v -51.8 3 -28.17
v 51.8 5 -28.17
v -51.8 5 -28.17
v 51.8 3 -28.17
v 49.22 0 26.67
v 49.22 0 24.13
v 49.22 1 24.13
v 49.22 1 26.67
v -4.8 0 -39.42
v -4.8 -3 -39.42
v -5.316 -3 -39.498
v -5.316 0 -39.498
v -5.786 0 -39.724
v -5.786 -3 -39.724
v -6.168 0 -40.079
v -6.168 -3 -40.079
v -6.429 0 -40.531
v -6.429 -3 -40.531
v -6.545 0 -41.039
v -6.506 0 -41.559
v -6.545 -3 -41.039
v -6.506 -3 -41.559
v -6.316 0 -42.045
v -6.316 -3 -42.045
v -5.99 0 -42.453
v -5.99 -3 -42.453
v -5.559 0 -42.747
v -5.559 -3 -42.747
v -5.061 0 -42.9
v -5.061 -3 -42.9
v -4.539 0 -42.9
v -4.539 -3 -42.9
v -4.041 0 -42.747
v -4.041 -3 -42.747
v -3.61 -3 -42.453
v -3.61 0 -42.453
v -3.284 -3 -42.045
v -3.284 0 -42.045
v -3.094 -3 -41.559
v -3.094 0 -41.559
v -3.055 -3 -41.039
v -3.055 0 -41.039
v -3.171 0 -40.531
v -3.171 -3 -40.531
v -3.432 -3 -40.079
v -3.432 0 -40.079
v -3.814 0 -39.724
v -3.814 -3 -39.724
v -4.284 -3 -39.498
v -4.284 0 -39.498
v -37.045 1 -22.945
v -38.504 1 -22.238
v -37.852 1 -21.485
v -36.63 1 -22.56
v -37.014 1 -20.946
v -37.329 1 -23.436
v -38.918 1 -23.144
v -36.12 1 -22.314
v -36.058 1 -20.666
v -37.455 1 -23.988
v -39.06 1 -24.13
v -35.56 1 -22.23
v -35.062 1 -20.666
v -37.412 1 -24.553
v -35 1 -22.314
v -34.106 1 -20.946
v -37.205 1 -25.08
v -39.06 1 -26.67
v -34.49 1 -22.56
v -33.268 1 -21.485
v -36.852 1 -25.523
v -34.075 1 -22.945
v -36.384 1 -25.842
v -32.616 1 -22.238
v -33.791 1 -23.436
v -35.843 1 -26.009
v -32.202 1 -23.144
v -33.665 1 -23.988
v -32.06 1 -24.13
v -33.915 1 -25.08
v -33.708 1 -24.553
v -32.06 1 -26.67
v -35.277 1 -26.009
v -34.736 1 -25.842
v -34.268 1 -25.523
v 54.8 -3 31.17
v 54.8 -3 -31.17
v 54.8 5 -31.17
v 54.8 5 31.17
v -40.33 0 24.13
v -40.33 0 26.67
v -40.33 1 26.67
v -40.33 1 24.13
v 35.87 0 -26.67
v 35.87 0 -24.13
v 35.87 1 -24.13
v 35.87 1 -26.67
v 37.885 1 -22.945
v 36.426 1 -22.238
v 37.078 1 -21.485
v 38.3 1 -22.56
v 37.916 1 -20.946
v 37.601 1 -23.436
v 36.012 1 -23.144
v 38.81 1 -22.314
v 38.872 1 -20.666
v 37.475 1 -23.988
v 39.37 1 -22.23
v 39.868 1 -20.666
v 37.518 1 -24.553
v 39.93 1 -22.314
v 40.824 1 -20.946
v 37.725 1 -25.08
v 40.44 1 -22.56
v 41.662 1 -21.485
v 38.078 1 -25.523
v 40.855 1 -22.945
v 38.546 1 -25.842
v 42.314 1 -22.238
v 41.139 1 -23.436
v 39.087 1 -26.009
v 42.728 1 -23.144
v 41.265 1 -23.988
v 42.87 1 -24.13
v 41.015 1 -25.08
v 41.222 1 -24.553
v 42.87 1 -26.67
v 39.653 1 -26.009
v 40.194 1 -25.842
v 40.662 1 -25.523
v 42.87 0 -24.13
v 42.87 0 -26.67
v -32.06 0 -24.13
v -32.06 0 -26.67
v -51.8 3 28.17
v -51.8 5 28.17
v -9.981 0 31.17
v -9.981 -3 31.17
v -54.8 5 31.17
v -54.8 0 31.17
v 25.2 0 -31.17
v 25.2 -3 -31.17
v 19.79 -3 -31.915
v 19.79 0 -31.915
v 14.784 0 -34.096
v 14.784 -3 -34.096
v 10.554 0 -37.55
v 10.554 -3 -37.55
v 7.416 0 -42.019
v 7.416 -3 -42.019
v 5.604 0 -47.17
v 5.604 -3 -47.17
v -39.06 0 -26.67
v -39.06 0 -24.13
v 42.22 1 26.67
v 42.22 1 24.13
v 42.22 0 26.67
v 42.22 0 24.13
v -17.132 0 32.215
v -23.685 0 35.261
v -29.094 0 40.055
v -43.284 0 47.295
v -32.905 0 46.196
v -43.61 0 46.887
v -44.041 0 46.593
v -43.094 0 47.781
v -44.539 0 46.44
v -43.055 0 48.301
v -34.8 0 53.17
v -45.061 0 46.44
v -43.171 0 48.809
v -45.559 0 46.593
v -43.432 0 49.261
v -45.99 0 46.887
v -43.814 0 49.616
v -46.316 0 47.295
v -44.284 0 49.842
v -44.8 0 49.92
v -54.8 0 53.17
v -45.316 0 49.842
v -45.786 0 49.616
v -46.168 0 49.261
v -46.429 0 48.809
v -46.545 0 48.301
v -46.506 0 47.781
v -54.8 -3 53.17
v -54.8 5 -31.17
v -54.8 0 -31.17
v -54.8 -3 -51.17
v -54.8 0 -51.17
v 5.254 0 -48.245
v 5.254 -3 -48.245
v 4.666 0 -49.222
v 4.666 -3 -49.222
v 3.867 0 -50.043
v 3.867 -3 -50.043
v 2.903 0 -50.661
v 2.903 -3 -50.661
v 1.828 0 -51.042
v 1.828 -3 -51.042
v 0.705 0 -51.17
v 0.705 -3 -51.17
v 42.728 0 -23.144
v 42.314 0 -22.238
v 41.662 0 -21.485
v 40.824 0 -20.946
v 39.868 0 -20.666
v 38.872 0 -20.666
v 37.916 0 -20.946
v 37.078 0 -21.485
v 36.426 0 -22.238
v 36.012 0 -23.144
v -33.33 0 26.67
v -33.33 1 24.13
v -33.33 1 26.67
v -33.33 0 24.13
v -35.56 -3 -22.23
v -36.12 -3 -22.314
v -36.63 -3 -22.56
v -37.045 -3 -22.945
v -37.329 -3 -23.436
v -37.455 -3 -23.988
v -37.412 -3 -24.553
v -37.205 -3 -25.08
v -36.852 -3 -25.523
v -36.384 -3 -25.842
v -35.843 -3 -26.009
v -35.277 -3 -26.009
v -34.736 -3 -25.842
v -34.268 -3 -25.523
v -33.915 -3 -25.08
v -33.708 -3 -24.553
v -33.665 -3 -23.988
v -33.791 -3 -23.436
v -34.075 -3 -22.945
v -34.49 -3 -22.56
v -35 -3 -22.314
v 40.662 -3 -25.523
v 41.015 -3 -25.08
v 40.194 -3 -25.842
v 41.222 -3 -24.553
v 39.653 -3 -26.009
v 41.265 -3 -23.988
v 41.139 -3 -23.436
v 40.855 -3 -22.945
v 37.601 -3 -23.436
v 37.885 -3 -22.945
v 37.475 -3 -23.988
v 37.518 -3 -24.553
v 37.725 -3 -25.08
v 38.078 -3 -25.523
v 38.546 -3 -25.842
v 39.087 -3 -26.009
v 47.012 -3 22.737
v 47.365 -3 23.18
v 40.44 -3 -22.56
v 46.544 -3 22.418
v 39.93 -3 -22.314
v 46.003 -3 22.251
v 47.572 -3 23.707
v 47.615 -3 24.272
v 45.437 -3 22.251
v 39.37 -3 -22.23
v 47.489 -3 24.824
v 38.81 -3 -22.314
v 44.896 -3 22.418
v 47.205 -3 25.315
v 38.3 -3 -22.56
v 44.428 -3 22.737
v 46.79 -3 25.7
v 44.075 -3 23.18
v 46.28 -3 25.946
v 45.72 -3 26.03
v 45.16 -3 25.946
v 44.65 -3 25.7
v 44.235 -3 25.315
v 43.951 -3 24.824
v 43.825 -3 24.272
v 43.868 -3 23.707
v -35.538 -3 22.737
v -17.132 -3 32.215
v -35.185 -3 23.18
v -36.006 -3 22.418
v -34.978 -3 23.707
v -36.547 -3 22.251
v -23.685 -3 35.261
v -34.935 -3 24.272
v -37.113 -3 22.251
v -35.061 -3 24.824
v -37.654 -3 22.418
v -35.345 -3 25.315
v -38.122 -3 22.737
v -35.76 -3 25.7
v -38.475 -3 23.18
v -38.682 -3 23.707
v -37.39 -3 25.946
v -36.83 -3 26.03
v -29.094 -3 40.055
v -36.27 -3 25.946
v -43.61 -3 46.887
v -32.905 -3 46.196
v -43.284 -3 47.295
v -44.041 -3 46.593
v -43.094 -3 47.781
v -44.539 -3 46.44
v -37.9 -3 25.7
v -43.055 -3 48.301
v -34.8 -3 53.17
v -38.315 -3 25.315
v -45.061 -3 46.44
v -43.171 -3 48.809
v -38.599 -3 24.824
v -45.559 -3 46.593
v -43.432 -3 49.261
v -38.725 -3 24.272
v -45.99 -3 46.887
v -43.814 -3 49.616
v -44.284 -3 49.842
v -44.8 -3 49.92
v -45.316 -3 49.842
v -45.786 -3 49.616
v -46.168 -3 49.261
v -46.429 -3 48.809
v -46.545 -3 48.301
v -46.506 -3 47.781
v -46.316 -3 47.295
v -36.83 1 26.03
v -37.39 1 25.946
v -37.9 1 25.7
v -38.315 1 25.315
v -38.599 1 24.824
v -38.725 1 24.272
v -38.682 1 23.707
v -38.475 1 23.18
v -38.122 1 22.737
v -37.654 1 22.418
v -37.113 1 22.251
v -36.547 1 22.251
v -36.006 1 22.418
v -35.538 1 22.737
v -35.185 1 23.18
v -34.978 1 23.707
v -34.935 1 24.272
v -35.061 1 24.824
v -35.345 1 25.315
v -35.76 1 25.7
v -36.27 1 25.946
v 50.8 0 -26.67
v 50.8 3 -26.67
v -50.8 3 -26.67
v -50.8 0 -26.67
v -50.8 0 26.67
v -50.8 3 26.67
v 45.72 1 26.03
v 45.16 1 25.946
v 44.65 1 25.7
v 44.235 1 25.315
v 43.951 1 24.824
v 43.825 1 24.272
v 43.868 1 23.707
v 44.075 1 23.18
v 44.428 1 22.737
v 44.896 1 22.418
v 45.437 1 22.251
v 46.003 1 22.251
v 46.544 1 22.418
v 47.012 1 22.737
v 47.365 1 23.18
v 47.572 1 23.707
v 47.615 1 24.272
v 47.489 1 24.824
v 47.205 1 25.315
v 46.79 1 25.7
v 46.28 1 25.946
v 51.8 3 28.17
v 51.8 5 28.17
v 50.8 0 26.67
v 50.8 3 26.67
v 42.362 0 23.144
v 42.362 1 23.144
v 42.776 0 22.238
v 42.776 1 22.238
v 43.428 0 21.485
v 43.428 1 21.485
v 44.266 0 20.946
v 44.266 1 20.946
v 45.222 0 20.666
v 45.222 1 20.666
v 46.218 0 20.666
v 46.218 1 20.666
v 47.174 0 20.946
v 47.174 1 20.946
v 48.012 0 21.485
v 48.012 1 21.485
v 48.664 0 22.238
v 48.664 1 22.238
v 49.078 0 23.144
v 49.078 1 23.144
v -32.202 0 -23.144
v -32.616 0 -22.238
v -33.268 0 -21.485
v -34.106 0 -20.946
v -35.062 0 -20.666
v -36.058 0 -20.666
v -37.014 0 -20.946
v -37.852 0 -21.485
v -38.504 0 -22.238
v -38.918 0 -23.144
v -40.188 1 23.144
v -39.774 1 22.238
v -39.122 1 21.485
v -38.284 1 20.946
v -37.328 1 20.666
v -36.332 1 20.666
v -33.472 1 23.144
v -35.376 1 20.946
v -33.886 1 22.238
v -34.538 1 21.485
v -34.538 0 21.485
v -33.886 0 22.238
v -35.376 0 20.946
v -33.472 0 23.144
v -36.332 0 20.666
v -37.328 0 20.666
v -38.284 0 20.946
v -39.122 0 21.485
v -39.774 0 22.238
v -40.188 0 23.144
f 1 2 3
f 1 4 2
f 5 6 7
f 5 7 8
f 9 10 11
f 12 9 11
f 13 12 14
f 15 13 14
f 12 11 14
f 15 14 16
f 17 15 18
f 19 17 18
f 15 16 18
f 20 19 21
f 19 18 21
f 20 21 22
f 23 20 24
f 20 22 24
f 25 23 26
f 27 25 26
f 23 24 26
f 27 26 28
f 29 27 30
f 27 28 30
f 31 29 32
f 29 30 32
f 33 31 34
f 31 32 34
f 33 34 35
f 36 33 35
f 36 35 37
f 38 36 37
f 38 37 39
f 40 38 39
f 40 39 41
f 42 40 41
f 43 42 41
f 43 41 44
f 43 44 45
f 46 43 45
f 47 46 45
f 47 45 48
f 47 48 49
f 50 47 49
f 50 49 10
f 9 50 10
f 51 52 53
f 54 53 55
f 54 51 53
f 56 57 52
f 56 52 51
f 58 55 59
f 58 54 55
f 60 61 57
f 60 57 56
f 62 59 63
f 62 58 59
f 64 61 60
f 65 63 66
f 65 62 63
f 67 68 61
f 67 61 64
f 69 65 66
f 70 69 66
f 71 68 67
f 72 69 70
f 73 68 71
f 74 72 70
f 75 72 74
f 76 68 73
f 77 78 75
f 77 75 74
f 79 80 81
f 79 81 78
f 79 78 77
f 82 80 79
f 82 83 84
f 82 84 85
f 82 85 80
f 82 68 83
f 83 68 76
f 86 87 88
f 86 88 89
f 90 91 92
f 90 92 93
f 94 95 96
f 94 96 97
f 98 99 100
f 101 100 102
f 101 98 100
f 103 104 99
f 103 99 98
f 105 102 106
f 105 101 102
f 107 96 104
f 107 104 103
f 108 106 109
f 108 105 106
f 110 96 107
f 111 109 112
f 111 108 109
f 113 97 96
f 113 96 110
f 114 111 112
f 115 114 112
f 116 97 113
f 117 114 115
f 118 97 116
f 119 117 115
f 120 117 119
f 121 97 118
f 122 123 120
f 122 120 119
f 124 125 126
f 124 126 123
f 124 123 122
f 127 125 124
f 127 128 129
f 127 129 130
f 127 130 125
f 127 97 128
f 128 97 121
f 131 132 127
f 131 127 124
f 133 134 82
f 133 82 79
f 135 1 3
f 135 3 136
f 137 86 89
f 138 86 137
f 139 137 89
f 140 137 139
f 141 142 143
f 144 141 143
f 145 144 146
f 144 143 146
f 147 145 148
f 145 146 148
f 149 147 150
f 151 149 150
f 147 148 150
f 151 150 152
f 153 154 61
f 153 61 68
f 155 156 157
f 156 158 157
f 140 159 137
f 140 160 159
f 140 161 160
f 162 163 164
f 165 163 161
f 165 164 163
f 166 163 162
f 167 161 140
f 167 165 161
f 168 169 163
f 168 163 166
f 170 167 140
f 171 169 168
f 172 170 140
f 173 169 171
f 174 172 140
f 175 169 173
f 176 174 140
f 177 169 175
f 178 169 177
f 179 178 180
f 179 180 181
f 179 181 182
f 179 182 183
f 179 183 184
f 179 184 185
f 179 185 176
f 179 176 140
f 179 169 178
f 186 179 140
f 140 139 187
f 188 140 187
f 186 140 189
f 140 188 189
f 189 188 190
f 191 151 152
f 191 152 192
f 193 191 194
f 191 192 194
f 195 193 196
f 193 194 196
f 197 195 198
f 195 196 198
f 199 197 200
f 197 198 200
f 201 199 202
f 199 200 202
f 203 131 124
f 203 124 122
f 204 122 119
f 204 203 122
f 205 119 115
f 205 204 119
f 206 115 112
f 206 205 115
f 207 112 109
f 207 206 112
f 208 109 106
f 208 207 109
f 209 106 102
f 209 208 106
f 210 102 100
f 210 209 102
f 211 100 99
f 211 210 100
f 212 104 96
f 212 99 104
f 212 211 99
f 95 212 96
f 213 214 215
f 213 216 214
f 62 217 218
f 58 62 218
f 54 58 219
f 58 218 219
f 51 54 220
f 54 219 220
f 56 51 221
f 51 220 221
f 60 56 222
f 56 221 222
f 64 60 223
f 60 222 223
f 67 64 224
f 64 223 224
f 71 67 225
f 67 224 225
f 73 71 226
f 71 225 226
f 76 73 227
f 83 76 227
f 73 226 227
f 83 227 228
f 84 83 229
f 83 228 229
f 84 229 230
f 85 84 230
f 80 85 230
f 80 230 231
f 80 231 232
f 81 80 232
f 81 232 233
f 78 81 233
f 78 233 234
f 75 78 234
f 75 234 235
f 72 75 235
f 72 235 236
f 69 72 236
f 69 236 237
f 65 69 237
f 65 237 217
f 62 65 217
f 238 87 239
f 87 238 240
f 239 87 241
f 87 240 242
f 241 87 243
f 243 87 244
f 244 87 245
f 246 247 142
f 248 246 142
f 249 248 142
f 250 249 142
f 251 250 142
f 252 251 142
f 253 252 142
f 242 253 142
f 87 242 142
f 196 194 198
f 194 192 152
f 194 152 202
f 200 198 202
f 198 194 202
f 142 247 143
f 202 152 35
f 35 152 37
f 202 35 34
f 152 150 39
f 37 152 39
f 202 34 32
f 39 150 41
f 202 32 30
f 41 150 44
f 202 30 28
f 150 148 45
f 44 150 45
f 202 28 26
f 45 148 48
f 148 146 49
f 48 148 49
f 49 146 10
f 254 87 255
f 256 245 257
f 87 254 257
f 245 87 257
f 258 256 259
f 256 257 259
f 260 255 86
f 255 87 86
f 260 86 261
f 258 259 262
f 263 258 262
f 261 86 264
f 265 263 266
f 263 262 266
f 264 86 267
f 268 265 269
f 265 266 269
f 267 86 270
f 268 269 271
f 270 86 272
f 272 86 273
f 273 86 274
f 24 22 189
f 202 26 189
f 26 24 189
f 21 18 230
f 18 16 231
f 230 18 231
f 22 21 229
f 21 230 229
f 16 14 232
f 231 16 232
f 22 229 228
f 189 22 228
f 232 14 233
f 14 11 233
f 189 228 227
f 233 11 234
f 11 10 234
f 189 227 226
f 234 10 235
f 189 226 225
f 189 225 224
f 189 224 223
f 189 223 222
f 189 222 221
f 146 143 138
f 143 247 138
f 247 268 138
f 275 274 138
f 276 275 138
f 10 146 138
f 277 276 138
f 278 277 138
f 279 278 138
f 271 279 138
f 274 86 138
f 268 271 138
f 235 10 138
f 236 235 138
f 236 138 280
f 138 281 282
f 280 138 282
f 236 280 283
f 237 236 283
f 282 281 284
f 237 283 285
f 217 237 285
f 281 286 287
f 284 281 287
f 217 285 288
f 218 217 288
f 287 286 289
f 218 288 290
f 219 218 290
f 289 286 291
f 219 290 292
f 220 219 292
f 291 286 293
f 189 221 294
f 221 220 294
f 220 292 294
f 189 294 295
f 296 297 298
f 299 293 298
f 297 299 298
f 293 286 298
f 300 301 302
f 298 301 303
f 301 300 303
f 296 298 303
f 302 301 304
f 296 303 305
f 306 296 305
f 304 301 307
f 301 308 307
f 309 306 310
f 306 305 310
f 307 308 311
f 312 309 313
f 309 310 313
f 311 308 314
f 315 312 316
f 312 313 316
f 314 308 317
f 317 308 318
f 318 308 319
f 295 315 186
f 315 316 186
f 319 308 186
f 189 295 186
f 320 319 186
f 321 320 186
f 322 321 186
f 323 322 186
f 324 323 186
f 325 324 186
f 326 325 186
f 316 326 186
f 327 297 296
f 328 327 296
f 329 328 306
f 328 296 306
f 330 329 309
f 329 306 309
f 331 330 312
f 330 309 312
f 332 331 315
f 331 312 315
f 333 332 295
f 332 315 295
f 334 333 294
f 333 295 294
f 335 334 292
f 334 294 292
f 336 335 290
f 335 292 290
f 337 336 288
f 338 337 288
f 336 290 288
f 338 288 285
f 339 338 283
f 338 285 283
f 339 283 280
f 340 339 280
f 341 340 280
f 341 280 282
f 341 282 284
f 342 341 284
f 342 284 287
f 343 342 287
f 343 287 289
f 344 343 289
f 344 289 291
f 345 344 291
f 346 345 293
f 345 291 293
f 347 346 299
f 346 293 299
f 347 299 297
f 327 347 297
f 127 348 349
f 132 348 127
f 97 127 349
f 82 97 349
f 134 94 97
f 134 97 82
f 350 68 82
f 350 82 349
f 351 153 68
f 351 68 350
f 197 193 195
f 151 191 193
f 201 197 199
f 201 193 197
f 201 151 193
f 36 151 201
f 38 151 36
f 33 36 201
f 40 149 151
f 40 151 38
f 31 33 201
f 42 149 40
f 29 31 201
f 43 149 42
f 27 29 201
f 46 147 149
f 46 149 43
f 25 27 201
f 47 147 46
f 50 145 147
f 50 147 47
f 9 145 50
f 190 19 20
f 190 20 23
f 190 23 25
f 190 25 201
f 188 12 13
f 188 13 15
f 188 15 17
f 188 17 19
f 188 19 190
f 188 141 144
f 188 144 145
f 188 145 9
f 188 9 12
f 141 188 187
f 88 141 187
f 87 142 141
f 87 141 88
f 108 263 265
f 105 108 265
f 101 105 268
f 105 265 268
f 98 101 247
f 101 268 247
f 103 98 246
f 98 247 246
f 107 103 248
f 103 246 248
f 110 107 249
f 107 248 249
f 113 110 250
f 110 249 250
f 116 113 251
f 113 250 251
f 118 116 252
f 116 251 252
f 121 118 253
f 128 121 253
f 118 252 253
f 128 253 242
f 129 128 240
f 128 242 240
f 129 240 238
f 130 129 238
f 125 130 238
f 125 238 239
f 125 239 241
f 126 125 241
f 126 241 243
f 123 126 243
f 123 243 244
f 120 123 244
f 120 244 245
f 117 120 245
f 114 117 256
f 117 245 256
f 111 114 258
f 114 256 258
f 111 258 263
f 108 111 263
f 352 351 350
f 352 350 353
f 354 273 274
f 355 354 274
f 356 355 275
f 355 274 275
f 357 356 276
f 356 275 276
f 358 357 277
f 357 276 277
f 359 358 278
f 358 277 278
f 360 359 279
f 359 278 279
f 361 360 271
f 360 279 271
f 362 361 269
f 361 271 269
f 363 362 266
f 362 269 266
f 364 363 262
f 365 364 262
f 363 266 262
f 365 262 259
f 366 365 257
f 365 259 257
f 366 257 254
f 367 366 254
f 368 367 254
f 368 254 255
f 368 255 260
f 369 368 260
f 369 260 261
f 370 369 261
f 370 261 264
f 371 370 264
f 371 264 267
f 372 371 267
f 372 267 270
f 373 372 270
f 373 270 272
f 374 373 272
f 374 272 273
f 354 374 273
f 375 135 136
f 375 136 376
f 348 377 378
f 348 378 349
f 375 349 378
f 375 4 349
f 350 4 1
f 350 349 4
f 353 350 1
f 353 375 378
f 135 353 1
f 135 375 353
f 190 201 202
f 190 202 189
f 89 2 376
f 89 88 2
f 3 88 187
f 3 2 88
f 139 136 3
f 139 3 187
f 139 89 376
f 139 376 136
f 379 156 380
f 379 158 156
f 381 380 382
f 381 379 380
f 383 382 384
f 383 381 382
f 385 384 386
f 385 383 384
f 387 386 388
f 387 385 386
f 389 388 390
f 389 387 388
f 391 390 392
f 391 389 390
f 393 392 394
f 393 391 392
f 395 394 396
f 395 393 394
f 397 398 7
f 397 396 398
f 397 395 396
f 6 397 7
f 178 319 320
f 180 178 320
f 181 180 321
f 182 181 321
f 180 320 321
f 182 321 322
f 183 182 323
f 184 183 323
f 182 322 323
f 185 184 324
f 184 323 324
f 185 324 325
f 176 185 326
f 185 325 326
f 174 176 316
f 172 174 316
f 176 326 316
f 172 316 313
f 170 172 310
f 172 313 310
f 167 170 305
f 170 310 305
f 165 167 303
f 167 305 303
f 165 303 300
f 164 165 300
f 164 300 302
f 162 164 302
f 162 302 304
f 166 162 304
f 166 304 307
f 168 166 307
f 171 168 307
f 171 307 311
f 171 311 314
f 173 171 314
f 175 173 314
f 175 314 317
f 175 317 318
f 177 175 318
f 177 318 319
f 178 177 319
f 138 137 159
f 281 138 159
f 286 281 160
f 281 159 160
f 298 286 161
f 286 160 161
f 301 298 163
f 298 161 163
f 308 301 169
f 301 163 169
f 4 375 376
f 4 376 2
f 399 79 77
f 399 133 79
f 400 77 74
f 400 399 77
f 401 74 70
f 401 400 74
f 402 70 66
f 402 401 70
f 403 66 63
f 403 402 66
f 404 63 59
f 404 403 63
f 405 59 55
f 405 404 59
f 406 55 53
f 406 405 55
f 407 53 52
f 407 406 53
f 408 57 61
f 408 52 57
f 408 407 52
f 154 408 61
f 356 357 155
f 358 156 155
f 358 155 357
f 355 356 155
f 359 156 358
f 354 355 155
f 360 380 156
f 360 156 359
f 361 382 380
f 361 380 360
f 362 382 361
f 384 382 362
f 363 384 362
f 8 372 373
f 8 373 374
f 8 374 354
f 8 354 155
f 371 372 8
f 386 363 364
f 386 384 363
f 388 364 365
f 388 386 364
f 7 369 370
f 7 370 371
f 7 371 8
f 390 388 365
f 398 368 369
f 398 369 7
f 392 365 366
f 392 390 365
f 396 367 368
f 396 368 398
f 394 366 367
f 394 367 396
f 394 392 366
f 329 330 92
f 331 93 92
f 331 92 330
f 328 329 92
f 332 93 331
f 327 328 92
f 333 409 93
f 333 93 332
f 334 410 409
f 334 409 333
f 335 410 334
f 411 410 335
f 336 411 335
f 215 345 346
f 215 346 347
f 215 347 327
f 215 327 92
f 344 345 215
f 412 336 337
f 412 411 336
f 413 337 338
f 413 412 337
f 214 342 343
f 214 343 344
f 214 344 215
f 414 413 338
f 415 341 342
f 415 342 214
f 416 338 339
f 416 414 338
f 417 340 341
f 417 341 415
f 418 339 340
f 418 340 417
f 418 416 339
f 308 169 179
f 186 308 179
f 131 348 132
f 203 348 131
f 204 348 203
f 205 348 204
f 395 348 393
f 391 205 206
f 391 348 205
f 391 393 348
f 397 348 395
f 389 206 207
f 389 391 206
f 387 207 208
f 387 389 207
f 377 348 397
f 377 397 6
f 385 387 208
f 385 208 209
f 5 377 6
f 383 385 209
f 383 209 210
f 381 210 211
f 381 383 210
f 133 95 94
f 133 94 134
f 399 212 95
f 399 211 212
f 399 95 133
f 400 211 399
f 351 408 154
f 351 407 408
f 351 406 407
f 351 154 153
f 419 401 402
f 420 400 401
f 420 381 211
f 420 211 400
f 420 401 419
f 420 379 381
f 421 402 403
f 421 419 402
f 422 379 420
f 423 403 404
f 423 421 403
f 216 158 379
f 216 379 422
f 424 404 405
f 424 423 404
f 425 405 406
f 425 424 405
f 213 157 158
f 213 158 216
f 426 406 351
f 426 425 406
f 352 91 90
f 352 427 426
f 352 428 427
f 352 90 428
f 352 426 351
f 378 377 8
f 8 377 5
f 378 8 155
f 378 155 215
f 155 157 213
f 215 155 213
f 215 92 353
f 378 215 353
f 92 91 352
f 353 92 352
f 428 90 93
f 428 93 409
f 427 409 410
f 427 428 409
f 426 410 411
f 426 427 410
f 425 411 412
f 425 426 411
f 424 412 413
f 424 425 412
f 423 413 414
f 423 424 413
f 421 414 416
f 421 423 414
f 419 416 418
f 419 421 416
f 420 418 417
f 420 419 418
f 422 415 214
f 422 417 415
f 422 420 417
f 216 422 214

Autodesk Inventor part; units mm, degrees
ref_plane "YZ Plane" through (0, 0, 0) normal (1, 0, 0) x (0, 1, 0)
ref_plane "XZ Plane" through (0, 0, 0) normal (0, 1, 0) x (-1, 0, 0)
ref_plane "XY Plane" through (0, 0, 0) normal (0, 0, 1) x (1, 0, 0)
sketch "Sketch1" plane through (0, 0, 0) normal (0, 1, 0) x (-1, 0, 0)
  line L0 (-50.8, 26.67) -> (-50.8, -26.67)
  line L1 (-50.8, -26.67) -> (50.8, -26.67)
  line L2 (50.8, -26.67) -> (50.8, 26.67)
  line L3 (50.8, 26.67) -> (-50.8, -26.67) construction
  line L4 (50.8, -26.67) -> (-50.8, 26.67) construction
  line L5 (51.8, 28.17) -> (-51.8, 28.17)
  line L6 (-51.8, 28.17) -> (-51.8, -28.17)
  line L7 (-51.8, -28.17) -> (51.8, -28.17)
  line L8 (51.8, -28.17) -> (51.8, 28.17)
  line L9 (51.8, 28.17) -> (-51.8, -28.17) construction
  line L10 (-51.8, 28.17) -> (51.8, -28.17) construction
  line L11 (-54.8, 31.17) -> (54.8, 31.17)
  line L12 (54.8, 31.17) -> (54.8, -31.17)
  line L13 (54.8, -31.17) -> (-54.8, -31.17)
  line L14 (-54.8, -31.17) -> (-54.8, 31.17)
  line L15 (-54.8, 31.17) -> (54.8, -31.17) construction
  line L16 (54.8, 31.17) -> (-54.8, -31.17) construction
  line L17 (54.8, -31.17) -> (-5.2, -31.17)
  line L18 (-5.2, -31.17) -> (-5.2, -51.17)
  line L19 (-5.2, -51.17) -> (54.8, -51.17)
  line L20 (54.8, -51.17) -> (54.8, -31.17)
  line L21 (54.8, -51.17) -> (34.8, -51.17)
  line L22 (-41.91, -26.67) -> (-36.83, -26.67)
  line L23 (38.1, -26.67) -> (33.02, -26.67)
  line L24 (54.8, -51.17) -> (34.8, -51.17)
  line L25 (34.8, -51.17) -> (34.8, 53.17)
  line L26 (34.8, 53.17) -> (54.8, 53.17)
  line L27 (54.8, 53.17) -> (54.8, -51.17)
  line L28 (-50.8, 26.67) -> (50.8, 26.67)
  point P0 (0, 0)
  point P1 (36.83, 24.13)
  point P2 (-45.72, 24.13)
  point P3 (-45.72, 24.13)
  point P4 (-39.37, -24.13)
  point P5 (35.56, -24.13)
  point P6 (0, 0)
  point P7 (0, 0)
  dimension "d0" = 101.6
  dimension "d1" = 53.34
  dimension "d2" = 13.97
  dimension "d4" = 96.52
  dimension "d5" = 90.17
  dimension "d7" = 15.24
  dimension "d8" = 101.6
  dimension "d11" = 103.6
  dimension "d12" = 56.34
  dimension "d13" = 62.34
  dimension "d14" = 109.6
  dimension "d15" = 20
  dimension "d25" = 60
  dimension "d31" = 20
  dimension "d33" = 0
  dimension "d60" = 25
extrude "Extrusion1" add sketch "Sketch1" against normal blind 3
extrude "Extrusion2" add sketch "Sketch1" along normal blind 5 contours L25 L11 L12 L13 L7 L8 L5 | L5 L6 L7 L25 L13 L14 L11
extrude "Extrusion6" add sketch "Sketch1" along normal blind 3 contours L0 L1 L25 L7 L6 L5 L28 | L25 L5 L8 L7 L1 L2 L28
sketch "Sketch5" plane through (0, 0, 0) normal (0, 1, 0) x (1, 0, 0)
  line L0 (50.8, -26.67) -> (-50.8, -26.67) projected
  arc A0 (-33.33, -24.13) -> (-40.33, -24.13) centre (-36.83, -24.13) ccw
  line L1 (-33.33, -24.13) -> (-33.33, -26.67)
  line L2 (-33.33, -26.67) -> (-40.33, -26.67)
  line L3 (-40.33, -26.67) -> (-40.33, -24.13)
  arc A1 (49.22, -24.13) -> (42.22, -24.13) centre (45.72, -24.13) ccw
  line L4 (42.22, -24.13) -> (42.22, -26.67)
  line L5 (-50.8, -26.67) -> (50.8, -26.67) projected
  line L6 (49.22, -24.13) -> (49.22, -26.67)
  line L7 (49.22, -26.67) -> (42.22, -26.67)
  arc A2 (35.87, 24.13) -> (42.87, 24.13) centre (39.37, 24.13) ccw
  line L8 (35.87, 24.13) -> (35.87, 26.67)
  line L9 (50.8, 26.67) -> (-50.8, 26.67) projected
  line L10 (35.87, 26.67) -> (42.87, 26.67)
  line L11 (42.87, 26.67) -> (42.87, 24.13)
  arc A3 (-39.06, 24.13) -> (-32.06, 24.13) centre (-35.56, 24.13) ccw
  line L12 (-39.06, 24.13) -> (-39.06, 26.67)
  line L13 (-39.06, 26.67) -> (-32.06, 26.67)
  line L14 (-32.06, 26.67) -> (-32.06, 24.13)
  point P0 (0, 0)
  dimension "d64" = 7
  dimension "d65" = 7
  dimension "d68" = 7
  dimension "d69" = 7
  dimension "d70" = 7
extrude "Extrusion7" add sketch "Sketch5" along normal blind 1
hole "Hole3" at (-36.83, 0, 24.13) at (-35.56, 0, -24.13) at (39.37, 0, -24.13) at (45.72, 0, 24.13) direction (0, -1, 0) diameter 3.8 end through all
sketch "Sketch6" plane through (0, 1, 0) normal (0, 1, 0) x (1, 0, 0)
  point P0 (0, 0)
  point P1 (-36.83, -24.13)
  point P2 (-35.56, 24.13)
  point P3 (39.37, 24.13)
  point P4 (45.72, -24.13)
hole "Hole4" at (-36.83, 1, 24.13) at (-35.56, 1, -24.13) at (39.37, 1, -24.13) at (45.72, 1, 24.13) direction (0, -1, 0) diameter 3.8 end through all
fillet "Fillet1" radius 25 1 edges at (-34.8, -1.5, 31.17)
fillet "Fillet2" radius 20 1 edges at (5.2, -1.5, -31.17)
fillet "Fillet3" radius 5 2 edges at (5.2, -1.5, -51.17) (-9.9807, -1.5, 31.17)
sketch "Sketch2" plane through (0, 0, 0) normal (0, 1, 0) x (1, 0, 0)
  line L0 (-34.8, -53.17) -> (-54.8, -53.17) projected
  line L1 (5.2, 31.17) -> (5.2, 51.17) projected
  line L2 (-54.8, 51.17) -> (-34.8, 51.17) projected
  circle A0 centre (-44.8, -48.17) radius 5
  circle A1 centre (-44.8, 41.17) radius 5
  circle A2 centre (-4.8, 41.17) radius 5
  line L3 (-49.8, -48.17) -> (-49.8, -53.17)
  line L4 (-39.8, -48.17) -> (-39.8, -53.17)
  line L5 (-34.8, -53.17) -> (-54.8, -53.17) projected
  line L6 (-39.8, -53.17) -> (-49.8, -53.17)
  line L7 (-54.8, 31.17) -> (-54.8, 51.17) projected
  line L8 (-54.8, -53.17) -> (-54.8, -31.17) projected
  point P0 (0, 0)
  point P1 (-36.8, -56.83)
  dimension "d35" = 5
  dimension "d37" = 10
  dimension "d38" = 10
  dimension "d39" = 10
  dimension "d40" = 10
  dimension "d41" = 10
  dimension "d42" = 10
  dimension "d85" = 10
  dimension "d86" = 10
hole "Hole5" at (-44.8, 0, 48.17) at (-4.8, 0, -41.17) direction (0, -1, 0) diameter 3.5 end through all
sketch "Sketch3" plane through (-44.8, 2, 48.17) normal (0, 1, 0) x (-1, 0, 0)
  arc A0 (-5, 0) -> (5, 0) centre (0, 0) ccw projected
  circle A1 centre (0, -89.34) radius 5 projected
  circle A2 centre (-40, -89.34) radius 5 projected
  line L0 (5, 5) -> (-5, 5) projected
  line L1 (-5, 5) -> (-5, 0) projected
  line L2 (5, 0) -> (5, 5) projected
  point P0 (-44.8, -48.17)
properties part number "support arduino_v2"
